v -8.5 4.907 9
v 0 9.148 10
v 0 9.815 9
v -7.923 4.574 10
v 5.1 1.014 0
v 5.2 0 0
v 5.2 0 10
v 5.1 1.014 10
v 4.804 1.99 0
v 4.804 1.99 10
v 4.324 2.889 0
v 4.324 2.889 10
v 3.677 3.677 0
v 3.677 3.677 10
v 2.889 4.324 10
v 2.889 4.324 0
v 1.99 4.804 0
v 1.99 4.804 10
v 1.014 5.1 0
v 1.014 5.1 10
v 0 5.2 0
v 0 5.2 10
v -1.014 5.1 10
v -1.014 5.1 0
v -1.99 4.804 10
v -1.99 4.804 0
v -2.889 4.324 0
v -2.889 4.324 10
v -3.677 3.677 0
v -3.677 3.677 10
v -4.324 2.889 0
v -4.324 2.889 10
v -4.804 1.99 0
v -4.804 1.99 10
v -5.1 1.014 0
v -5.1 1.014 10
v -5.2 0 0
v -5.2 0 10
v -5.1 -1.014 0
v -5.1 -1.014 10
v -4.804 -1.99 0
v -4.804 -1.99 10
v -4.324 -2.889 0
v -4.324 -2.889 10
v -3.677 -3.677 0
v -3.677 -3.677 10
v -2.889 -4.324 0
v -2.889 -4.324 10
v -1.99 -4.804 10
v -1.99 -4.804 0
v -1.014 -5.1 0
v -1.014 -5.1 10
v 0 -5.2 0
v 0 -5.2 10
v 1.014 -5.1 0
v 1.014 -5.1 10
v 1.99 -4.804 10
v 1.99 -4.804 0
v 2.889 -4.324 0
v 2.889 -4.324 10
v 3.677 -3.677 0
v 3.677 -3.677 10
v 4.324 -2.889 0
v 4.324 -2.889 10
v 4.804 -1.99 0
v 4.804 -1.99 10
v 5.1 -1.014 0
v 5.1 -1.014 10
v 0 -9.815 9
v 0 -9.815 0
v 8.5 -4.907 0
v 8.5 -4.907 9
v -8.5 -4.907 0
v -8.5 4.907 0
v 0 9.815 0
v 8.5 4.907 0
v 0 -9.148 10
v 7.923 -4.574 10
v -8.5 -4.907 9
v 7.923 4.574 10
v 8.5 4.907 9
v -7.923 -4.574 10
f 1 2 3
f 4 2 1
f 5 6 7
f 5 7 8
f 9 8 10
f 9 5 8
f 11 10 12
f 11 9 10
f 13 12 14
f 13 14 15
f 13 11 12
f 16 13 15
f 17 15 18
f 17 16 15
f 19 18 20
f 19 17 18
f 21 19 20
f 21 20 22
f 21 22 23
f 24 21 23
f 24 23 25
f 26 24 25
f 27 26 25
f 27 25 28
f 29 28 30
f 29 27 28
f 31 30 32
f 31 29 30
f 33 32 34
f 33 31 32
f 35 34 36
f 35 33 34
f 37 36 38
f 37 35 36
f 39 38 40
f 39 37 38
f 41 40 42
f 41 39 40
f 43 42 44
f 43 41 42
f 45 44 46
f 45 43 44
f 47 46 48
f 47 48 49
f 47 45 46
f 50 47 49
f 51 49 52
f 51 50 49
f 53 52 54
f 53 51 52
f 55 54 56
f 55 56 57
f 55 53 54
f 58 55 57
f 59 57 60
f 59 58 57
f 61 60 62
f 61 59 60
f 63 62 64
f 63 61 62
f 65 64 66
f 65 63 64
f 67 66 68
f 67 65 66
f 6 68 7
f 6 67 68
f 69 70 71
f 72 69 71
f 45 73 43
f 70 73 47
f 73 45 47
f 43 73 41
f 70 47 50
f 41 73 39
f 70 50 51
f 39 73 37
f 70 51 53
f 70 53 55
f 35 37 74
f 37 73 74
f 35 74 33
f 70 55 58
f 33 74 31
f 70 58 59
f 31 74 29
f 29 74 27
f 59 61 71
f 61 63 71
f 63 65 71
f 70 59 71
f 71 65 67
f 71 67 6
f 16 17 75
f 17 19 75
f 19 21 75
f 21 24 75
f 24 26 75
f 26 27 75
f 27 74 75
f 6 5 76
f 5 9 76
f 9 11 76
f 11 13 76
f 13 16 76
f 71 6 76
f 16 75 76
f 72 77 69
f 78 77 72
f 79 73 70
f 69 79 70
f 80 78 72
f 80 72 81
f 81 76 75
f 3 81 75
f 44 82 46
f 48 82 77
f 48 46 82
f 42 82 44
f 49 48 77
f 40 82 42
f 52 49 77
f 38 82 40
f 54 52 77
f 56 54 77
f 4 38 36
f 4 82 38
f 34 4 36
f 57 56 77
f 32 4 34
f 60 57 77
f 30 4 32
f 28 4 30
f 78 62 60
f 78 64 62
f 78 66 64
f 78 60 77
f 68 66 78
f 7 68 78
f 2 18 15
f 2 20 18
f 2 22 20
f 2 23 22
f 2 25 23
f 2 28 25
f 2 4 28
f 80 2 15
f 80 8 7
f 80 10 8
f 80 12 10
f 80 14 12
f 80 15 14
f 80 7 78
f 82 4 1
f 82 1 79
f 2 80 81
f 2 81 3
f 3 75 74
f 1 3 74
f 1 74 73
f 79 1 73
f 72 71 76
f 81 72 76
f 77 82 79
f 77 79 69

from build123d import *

# Parameters (mm, degrees)
F0_R     = 5.2
F1_DEPTH = 10
F2_SIZE2 = 0.57735
F2_SIZE  = 1


with BuildPart() as f1:
    # F0 (on Top) → F1 (new body)
    with BuildSketch(Plane.XY):
        Polygon((8.5, -4.907477), (8.5, 4.907477), (0, 9.814955), (-8.5, 4.907477), (-8.5, -4.907477), (0, -9.814955), align=None)
        Circle(F0_R, mode=Mode.SUBTRACT)
    extrude(amount=F1_DEPTH)

    # F2
    f2_edges = [f1.edges().sort_by_distance(p)[0] for p in [
        (-4.25, 7.361216, 10),
        (4.25, 7.361216, 10),
        (8.5, 0, 10),
        (4.25, -7.361216, 10),
        (-4.25, -7.361216, 10),
        (-8.5, 0, 10),
    ]]
    chamfer(f2_edges, length=F2_SIZE, length2=F2_SIZE2)


solid = f1.part
